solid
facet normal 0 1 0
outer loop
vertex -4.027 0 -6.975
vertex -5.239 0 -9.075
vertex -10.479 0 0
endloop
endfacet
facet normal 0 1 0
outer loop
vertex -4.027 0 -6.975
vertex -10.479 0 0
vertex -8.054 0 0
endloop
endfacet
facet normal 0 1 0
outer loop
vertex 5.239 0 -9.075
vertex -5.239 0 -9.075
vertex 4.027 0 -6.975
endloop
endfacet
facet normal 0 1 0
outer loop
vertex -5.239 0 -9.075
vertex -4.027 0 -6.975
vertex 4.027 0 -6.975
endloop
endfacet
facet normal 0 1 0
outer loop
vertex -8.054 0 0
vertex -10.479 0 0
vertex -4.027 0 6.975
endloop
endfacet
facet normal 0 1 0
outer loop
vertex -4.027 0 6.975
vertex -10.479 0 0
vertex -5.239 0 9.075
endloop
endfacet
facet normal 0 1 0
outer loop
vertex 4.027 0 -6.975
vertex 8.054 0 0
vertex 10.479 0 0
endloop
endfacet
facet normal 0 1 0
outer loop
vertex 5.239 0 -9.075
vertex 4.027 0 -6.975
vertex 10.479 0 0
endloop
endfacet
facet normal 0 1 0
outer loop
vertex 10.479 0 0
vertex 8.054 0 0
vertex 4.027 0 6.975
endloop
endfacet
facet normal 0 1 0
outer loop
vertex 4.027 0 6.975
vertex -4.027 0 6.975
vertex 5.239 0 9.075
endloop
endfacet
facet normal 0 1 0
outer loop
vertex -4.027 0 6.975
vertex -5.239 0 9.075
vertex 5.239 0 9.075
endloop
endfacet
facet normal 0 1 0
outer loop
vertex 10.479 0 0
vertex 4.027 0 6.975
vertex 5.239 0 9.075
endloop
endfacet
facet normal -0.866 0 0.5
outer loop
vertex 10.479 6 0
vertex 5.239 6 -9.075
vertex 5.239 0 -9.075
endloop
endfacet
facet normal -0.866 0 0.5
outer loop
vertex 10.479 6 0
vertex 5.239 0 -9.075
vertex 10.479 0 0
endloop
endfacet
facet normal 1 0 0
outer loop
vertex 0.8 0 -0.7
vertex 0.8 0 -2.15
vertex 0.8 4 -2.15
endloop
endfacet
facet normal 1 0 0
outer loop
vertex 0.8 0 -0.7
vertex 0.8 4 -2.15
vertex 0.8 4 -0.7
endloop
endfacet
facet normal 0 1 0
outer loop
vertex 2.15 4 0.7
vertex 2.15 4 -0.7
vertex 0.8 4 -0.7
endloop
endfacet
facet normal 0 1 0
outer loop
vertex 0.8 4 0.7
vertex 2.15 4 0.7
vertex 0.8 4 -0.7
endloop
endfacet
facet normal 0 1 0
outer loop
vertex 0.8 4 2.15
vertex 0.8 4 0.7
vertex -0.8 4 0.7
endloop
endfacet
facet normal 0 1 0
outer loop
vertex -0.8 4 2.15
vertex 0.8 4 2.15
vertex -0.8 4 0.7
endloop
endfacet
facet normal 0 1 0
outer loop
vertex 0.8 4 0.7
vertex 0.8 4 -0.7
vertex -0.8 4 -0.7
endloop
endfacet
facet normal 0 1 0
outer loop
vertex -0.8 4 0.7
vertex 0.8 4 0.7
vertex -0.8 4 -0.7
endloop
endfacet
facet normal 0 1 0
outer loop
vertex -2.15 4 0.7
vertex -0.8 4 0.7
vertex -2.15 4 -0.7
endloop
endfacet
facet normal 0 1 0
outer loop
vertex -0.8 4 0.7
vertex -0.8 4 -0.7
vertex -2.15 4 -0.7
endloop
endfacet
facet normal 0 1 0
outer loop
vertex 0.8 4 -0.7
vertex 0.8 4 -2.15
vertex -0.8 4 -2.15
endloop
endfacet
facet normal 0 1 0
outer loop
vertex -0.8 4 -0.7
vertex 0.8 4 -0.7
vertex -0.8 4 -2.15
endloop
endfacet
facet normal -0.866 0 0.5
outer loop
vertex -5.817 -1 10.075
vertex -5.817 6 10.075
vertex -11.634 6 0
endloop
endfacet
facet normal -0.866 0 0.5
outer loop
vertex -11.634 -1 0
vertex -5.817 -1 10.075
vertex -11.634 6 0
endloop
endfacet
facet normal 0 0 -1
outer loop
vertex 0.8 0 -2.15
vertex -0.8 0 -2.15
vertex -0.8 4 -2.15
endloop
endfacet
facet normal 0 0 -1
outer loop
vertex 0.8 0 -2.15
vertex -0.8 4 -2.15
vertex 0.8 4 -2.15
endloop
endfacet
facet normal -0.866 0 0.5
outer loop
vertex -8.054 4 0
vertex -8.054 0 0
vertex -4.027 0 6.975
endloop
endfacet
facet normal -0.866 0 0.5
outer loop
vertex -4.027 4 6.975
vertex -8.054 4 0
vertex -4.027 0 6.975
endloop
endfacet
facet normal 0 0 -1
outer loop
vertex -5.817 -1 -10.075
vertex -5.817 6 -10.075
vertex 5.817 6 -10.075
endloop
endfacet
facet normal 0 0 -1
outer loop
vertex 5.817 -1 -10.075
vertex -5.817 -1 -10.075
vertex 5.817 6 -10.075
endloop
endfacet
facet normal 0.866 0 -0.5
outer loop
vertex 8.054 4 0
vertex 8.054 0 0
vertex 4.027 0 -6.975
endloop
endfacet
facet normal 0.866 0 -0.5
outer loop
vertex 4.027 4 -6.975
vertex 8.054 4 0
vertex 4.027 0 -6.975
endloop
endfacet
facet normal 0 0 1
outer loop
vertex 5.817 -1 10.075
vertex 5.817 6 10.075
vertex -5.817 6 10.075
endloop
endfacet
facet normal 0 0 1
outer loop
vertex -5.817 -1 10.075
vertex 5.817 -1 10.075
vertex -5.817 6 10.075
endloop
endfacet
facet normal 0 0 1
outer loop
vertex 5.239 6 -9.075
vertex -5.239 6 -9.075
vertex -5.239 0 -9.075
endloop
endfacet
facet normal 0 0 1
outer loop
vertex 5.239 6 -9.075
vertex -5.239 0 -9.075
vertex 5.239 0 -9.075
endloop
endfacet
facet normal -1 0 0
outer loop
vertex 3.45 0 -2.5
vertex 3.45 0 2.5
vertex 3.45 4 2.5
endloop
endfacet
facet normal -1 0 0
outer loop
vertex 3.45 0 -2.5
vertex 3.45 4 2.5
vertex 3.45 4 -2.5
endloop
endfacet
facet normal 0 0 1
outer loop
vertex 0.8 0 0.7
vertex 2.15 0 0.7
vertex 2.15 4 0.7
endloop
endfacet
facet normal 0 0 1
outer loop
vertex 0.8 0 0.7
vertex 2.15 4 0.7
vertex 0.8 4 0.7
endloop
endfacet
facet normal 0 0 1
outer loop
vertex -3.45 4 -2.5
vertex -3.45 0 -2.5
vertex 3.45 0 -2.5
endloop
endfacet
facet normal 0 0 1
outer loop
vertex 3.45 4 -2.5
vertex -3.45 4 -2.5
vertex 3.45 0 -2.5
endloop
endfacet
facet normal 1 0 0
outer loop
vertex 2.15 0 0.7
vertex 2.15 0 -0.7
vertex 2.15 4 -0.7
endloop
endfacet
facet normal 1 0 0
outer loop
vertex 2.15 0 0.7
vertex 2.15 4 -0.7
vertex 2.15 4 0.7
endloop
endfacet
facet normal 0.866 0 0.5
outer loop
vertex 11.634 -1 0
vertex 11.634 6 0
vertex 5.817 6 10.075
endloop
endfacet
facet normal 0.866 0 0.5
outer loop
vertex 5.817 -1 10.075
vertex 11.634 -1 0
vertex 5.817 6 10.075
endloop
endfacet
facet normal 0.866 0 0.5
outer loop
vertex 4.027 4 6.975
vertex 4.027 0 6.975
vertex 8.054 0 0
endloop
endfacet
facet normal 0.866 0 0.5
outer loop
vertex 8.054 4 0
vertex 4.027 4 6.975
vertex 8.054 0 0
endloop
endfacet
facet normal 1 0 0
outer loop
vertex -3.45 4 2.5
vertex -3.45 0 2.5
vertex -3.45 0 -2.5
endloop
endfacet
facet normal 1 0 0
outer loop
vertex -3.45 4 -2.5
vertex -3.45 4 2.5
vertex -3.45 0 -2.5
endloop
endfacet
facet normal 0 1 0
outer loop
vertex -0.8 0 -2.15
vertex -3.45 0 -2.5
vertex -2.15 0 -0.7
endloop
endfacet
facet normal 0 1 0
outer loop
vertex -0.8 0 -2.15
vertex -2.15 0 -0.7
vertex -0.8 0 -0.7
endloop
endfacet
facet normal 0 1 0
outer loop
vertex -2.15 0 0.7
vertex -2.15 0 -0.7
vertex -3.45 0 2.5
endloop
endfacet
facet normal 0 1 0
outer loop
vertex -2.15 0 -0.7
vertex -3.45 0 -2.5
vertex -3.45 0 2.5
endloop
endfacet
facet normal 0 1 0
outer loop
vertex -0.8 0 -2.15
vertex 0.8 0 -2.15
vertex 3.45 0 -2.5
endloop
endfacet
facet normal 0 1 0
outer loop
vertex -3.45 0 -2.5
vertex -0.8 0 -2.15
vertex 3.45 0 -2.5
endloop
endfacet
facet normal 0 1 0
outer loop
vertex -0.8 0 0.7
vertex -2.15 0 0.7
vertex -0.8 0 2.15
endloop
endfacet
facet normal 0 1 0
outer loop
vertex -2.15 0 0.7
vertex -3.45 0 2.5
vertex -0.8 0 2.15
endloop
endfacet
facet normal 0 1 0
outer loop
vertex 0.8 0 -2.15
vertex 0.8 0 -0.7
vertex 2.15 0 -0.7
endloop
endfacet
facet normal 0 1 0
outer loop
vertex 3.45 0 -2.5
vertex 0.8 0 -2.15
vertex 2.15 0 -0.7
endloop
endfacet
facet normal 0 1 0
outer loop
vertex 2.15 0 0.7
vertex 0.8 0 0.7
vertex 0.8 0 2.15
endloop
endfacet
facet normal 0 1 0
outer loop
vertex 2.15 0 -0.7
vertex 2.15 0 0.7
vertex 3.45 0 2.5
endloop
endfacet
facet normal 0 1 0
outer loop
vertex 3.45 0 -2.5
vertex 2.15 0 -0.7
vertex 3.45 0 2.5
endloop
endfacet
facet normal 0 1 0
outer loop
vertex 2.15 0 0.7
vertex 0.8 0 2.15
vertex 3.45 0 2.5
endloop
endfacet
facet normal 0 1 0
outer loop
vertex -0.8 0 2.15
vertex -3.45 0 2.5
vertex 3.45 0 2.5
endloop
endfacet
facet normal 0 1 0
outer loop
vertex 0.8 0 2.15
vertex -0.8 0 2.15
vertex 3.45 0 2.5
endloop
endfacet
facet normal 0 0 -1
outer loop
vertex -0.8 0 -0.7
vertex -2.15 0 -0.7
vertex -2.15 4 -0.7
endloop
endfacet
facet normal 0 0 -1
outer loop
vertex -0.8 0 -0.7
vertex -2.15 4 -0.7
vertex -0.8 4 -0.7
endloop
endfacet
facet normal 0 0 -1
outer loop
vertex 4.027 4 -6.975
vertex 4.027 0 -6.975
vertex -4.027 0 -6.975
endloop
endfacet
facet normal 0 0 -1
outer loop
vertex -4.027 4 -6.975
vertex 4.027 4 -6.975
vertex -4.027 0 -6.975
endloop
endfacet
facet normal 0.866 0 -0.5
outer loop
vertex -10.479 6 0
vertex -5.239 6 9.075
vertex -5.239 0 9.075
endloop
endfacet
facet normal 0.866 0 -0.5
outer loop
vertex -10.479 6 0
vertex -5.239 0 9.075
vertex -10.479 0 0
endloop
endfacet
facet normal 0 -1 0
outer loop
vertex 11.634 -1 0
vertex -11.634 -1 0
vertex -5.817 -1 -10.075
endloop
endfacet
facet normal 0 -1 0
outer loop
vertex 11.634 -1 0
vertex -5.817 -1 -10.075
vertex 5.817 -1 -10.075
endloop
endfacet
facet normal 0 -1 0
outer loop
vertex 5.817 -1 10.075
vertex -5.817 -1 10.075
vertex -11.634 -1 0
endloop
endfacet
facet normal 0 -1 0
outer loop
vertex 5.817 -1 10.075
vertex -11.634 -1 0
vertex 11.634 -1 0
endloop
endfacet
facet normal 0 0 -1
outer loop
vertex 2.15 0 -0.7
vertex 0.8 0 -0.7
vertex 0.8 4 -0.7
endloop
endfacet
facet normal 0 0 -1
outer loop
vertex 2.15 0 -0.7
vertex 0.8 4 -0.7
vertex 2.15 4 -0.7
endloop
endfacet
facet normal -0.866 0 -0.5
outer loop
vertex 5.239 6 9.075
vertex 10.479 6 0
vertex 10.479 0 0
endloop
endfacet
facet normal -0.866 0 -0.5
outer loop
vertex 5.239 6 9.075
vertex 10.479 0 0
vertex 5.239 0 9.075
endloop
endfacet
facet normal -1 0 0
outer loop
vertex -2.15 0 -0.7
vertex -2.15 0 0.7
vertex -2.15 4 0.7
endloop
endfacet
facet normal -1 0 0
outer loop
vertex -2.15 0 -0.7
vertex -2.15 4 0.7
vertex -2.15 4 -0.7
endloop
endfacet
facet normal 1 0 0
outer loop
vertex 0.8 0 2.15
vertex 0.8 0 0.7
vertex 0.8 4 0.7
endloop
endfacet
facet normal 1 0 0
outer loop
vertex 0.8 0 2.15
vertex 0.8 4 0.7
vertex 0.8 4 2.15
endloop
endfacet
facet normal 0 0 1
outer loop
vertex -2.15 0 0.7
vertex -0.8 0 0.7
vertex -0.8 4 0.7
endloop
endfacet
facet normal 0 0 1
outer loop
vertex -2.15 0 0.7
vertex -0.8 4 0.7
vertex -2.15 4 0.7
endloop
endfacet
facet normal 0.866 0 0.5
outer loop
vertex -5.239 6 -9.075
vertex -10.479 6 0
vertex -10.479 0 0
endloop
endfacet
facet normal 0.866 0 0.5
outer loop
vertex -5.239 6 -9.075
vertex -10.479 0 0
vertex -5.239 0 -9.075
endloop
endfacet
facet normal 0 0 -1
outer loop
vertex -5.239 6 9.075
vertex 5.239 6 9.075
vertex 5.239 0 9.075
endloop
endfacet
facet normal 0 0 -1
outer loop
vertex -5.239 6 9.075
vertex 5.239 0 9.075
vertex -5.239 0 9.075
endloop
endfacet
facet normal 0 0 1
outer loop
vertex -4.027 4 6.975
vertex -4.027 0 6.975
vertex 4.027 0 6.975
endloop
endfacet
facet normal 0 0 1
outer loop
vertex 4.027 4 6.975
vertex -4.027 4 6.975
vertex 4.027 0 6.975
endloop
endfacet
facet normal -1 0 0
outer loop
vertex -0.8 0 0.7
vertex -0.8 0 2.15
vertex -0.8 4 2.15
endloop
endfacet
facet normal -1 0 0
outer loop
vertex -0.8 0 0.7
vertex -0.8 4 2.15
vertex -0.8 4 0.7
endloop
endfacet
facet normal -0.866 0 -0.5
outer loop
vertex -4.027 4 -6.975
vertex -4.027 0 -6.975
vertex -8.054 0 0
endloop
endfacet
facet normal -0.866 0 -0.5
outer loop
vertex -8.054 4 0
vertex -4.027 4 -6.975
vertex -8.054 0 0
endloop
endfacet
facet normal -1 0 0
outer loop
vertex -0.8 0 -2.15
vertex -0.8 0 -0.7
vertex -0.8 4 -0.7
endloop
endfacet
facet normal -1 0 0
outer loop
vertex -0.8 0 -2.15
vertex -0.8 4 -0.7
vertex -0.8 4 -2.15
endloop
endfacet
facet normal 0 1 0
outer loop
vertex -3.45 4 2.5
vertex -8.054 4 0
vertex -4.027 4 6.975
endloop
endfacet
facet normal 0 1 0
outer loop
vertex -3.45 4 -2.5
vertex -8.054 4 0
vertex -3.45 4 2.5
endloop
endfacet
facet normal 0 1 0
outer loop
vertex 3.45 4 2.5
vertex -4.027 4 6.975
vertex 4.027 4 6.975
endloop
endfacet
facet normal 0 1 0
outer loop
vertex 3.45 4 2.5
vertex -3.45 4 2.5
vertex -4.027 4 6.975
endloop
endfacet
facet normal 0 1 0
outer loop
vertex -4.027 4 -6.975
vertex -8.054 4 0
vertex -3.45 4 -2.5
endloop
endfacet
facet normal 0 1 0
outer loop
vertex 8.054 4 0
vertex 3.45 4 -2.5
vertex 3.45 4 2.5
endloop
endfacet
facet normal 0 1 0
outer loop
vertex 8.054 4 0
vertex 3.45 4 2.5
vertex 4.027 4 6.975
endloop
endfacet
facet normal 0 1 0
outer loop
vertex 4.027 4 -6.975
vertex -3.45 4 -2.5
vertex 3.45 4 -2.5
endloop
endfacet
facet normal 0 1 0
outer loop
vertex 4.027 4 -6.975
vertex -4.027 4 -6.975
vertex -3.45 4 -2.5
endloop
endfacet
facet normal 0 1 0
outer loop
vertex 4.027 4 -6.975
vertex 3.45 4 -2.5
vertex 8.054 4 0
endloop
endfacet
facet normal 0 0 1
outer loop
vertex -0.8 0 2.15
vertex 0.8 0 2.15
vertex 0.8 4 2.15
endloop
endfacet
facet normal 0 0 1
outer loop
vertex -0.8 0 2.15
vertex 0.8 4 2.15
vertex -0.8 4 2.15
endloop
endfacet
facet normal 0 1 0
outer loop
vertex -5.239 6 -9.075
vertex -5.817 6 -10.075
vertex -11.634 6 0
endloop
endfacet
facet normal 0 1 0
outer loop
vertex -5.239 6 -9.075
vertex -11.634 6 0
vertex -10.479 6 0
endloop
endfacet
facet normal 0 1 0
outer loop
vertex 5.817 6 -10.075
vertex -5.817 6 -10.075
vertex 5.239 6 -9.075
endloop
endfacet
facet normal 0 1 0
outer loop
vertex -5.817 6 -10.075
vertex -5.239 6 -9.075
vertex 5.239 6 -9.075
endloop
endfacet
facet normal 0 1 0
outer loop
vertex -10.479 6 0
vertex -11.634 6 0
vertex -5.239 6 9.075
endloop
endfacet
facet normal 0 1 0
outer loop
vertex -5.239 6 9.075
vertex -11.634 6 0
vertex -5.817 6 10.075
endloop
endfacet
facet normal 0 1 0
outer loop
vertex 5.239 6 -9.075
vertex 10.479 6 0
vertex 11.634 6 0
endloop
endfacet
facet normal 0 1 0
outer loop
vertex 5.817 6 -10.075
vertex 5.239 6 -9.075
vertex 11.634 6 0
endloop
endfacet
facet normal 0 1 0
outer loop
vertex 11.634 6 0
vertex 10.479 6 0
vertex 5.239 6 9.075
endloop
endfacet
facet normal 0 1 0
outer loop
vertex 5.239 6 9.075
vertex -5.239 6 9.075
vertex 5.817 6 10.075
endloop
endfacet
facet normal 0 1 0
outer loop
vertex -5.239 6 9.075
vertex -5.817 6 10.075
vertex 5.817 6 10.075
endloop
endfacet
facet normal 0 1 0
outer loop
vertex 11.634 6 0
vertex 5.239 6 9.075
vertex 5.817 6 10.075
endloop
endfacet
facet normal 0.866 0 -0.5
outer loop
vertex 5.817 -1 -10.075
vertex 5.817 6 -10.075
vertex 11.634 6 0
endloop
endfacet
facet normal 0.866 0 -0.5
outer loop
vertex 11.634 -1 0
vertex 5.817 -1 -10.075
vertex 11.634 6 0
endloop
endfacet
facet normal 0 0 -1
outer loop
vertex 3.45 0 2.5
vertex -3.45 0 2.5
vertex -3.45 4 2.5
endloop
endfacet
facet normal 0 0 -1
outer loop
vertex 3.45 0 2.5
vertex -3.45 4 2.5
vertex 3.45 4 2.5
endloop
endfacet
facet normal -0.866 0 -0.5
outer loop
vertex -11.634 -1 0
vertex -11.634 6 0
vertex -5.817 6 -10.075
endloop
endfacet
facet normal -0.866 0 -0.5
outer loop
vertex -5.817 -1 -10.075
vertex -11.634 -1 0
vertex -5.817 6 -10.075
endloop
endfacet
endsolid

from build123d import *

# Parameters (mm, degrees)
CROSS_DEPTH         = 4
BOTTOM_DEPTH        = 1
WALLS_DEPTH         = 1
WALLS_DEPTH_BACK    = 6
SKETCH5_W           = 6.9
SKETCH5_H           = 5
BOSS_EXTRUDE4_DEPTH = 4


with BuildPart() as part:
    # Sketch1 → Cross (new body)
    with BuildSketch(Plane(origin=(0, 0, 0), x_dir=(1, 0, 0), z_dir=(0, 1, 0))):
        Polygon((-0.8, 2.15), (0.8, 2.15), (0.8, 0.7), (2.15, 0.7), (2.15, -0.7), (0.8, -0.7), (0.8, -2.15), (-0.8, -2.15), (-0.8, -0.7), (-2.15, -0.7), (-2.15, 0.7), (-0.8, 0.7), align=None)
    extrude(amount=CROSS_DEPTH)

    # Sketch3 → Bottom (add)
    with BuildSketch(Plane.XZ):
        Polygon((10.478907386, 0), (5.239453693, 9.075), (-5.239453693, 9.075), (-10.478907386, 0), (-5.239453693, -9.075), (5.239453693, -9.075), align=None)
    extrude(amount=BOTTOM_DEPTH)

    # Sketch4 → Walls (add, two sides: drawn at the far end of the back side and taken through both)
    with BuildSketch(Plane.XZ.offset(-WALLS_DEPTH_BACK)):
        Polygon((5.816803962, -10.075), (11.633607924, 0), (5.816803962, 10.075), (-5.816803962, 10.075), (-11.633607924, 0), (-5.816803962, -10.075), align=None)
        Polygon((5.239453693, -9.075), (10.478907386, 0), (5.239453693, 9.075), (-5.239453693, 9.075), (-10.478907386, 0), (-5.239453693, -9.075), align=None, mode=Mode.SUBTRACT)
    extrude(amount=WALLS_DEPTH + WALLS_DEPTH_BACK)

    # Sketch5 → Boss-Extrude4 (add)
    with BuildSketch(Plane(origin=(0, 0, 0), x_dir=(1, 0, 0), z_dir=(0, 1, 0))):
        Polygon((8.054036255, 0), (4.027018128, 6.975), (-4.027018128, 6.975), (-8.054036255, 0), (-4.027018128, -6.975), (4.027018128, -6.975), align=None)
        Rectangle(SKETCH5_W, SKETCH5_H, mode=Mode.SUBTRACT)
    extrude(amount=BOSS_EXTRUDE4_DEPTH)


solid = part.part
